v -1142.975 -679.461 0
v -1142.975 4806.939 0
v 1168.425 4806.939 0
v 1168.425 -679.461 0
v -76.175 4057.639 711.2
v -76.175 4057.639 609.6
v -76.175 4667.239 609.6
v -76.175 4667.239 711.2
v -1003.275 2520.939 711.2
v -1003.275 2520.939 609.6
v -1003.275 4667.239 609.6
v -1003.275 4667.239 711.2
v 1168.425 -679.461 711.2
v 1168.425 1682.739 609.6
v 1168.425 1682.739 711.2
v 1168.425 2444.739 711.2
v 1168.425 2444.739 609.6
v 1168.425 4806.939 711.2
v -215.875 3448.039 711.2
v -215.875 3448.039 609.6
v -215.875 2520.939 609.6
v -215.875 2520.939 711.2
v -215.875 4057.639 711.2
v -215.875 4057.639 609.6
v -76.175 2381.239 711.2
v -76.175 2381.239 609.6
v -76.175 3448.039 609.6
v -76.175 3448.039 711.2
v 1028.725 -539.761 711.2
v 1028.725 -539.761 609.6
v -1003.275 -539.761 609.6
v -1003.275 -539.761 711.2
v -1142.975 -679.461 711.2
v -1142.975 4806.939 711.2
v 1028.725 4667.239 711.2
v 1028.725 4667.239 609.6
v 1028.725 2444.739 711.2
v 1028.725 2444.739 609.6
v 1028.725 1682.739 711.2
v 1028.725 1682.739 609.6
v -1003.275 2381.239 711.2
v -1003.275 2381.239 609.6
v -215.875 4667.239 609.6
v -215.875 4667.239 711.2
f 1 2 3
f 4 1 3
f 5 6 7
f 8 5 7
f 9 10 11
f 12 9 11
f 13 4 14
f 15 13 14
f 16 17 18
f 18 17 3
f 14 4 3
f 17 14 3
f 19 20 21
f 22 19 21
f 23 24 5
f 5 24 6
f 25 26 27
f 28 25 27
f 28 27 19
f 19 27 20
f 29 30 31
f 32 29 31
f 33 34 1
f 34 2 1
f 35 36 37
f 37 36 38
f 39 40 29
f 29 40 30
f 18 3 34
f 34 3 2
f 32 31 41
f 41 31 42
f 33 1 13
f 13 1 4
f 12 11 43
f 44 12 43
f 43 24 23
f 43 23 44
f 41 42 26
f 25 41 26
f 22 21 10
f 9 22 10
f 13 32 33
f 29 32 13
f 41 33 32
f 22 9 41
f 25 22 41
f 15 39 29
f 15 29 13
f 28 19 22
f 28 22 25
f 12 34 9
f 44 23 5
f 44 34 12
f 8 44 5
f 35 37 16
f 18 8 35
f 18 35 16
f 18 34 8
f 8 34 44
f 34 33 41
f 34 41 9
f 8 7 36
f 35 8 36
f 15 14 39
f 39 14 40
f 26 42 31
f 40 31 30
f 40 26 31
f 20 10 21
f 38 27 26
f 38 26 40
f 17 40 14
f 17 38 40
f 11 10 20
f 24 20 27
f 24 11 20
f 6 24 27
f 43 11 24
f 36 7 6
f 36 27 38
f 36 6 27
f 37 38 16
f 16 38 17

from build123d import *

# Parameters (mm, degrees)
F1_DEPTH = 609.6
F2_W     = 139.7
F2_H     = 609.6
F3_DEPTH = 101.6


with BuildPart() as f1:
    # F0 (on Top) → F1 (new body)
    with BuildSketch(Plane.XY):
        Polygon((-1142.9754019082, 4806.9390297801), (-1142.9754019082, -679.4609702199), (694.7043538094, -679.4609702199), (1168.4245980918, -679.4609702199), (1168.4245980918, -422.2676753998), (1168.4245980918, 4806.9390297801), align=None)
    extrude(amount=F1_DEPTH)

    # F2 (on face) → F3 (join)
    with BuildSketch(Plane.XY.offset(609.6)):
        Polygon((-76.1754019082, 4667.2390297801), (1028.7245980918, 4667.2390297801), (1028.7245980918, 2444.7390297801), (1168.4245980918, 2444.7390297801), (1168.4245980918, 4806.9390297801), (-1142.9754019082, 4806.9390297801), (-1142.9754019082, 2444.7390297801), (-1003.2754019082, 2444.7390297801), (-1003.2754019082, 2520.9390297801), (-1003.2754019082, 4667.2390297801), (-215.8754019082, 4667.2390297801), align=None)
        with Locations((-146.0254019082, 4362.4390297801)):
            Rectangle(F2_W, F2_H)
        Polygon((-76.1754019082, 2381.2390297801), (-76.1754019082, 3448.0390297801), (-215.8754019082, 3448.0390297801), (-215.8754019082, 2520.9390297801), (-1003.2754019082, 2520.9390297801), (-1003.2754019082, 2444.7390297801), (-1003.2754019082, 2381.2390297801), align=None)
        Polygon((393.7245980918, -679.4609702199), (393.7245980918, -539.7609702199), (-1003.2754019082, -539.7609702199), (-1003.2754019082, 1682.7390297801), (-1142.9754019082, 1682.7390297801), (-1142.9754019082, -679.4609702199), (-368.2754019082, -679.4609702199), align=None)
        Polygon((-1003.2754019082, 2381.2390297801), (-1003.2754019082, 2444.7390297801), (-1142.9754019082, 2444.7390297801), (-1142.9754019082, 1682.7390297801), (-1003.2754019082, 1682.7390297801), align=None)
        Polygon((1168.4245980918, 1682.7390297801), (1028.7245980918, 1682.7390297801), (1028.7245980918, -539.7609702199), (393.7245980918, -539.7609702199), (393.7245980918, -679.4609702199), (1168.4245980918, -679.4609702199), align=None)
    extrude(amount=F3_DEPTH)


solid = f1.part
